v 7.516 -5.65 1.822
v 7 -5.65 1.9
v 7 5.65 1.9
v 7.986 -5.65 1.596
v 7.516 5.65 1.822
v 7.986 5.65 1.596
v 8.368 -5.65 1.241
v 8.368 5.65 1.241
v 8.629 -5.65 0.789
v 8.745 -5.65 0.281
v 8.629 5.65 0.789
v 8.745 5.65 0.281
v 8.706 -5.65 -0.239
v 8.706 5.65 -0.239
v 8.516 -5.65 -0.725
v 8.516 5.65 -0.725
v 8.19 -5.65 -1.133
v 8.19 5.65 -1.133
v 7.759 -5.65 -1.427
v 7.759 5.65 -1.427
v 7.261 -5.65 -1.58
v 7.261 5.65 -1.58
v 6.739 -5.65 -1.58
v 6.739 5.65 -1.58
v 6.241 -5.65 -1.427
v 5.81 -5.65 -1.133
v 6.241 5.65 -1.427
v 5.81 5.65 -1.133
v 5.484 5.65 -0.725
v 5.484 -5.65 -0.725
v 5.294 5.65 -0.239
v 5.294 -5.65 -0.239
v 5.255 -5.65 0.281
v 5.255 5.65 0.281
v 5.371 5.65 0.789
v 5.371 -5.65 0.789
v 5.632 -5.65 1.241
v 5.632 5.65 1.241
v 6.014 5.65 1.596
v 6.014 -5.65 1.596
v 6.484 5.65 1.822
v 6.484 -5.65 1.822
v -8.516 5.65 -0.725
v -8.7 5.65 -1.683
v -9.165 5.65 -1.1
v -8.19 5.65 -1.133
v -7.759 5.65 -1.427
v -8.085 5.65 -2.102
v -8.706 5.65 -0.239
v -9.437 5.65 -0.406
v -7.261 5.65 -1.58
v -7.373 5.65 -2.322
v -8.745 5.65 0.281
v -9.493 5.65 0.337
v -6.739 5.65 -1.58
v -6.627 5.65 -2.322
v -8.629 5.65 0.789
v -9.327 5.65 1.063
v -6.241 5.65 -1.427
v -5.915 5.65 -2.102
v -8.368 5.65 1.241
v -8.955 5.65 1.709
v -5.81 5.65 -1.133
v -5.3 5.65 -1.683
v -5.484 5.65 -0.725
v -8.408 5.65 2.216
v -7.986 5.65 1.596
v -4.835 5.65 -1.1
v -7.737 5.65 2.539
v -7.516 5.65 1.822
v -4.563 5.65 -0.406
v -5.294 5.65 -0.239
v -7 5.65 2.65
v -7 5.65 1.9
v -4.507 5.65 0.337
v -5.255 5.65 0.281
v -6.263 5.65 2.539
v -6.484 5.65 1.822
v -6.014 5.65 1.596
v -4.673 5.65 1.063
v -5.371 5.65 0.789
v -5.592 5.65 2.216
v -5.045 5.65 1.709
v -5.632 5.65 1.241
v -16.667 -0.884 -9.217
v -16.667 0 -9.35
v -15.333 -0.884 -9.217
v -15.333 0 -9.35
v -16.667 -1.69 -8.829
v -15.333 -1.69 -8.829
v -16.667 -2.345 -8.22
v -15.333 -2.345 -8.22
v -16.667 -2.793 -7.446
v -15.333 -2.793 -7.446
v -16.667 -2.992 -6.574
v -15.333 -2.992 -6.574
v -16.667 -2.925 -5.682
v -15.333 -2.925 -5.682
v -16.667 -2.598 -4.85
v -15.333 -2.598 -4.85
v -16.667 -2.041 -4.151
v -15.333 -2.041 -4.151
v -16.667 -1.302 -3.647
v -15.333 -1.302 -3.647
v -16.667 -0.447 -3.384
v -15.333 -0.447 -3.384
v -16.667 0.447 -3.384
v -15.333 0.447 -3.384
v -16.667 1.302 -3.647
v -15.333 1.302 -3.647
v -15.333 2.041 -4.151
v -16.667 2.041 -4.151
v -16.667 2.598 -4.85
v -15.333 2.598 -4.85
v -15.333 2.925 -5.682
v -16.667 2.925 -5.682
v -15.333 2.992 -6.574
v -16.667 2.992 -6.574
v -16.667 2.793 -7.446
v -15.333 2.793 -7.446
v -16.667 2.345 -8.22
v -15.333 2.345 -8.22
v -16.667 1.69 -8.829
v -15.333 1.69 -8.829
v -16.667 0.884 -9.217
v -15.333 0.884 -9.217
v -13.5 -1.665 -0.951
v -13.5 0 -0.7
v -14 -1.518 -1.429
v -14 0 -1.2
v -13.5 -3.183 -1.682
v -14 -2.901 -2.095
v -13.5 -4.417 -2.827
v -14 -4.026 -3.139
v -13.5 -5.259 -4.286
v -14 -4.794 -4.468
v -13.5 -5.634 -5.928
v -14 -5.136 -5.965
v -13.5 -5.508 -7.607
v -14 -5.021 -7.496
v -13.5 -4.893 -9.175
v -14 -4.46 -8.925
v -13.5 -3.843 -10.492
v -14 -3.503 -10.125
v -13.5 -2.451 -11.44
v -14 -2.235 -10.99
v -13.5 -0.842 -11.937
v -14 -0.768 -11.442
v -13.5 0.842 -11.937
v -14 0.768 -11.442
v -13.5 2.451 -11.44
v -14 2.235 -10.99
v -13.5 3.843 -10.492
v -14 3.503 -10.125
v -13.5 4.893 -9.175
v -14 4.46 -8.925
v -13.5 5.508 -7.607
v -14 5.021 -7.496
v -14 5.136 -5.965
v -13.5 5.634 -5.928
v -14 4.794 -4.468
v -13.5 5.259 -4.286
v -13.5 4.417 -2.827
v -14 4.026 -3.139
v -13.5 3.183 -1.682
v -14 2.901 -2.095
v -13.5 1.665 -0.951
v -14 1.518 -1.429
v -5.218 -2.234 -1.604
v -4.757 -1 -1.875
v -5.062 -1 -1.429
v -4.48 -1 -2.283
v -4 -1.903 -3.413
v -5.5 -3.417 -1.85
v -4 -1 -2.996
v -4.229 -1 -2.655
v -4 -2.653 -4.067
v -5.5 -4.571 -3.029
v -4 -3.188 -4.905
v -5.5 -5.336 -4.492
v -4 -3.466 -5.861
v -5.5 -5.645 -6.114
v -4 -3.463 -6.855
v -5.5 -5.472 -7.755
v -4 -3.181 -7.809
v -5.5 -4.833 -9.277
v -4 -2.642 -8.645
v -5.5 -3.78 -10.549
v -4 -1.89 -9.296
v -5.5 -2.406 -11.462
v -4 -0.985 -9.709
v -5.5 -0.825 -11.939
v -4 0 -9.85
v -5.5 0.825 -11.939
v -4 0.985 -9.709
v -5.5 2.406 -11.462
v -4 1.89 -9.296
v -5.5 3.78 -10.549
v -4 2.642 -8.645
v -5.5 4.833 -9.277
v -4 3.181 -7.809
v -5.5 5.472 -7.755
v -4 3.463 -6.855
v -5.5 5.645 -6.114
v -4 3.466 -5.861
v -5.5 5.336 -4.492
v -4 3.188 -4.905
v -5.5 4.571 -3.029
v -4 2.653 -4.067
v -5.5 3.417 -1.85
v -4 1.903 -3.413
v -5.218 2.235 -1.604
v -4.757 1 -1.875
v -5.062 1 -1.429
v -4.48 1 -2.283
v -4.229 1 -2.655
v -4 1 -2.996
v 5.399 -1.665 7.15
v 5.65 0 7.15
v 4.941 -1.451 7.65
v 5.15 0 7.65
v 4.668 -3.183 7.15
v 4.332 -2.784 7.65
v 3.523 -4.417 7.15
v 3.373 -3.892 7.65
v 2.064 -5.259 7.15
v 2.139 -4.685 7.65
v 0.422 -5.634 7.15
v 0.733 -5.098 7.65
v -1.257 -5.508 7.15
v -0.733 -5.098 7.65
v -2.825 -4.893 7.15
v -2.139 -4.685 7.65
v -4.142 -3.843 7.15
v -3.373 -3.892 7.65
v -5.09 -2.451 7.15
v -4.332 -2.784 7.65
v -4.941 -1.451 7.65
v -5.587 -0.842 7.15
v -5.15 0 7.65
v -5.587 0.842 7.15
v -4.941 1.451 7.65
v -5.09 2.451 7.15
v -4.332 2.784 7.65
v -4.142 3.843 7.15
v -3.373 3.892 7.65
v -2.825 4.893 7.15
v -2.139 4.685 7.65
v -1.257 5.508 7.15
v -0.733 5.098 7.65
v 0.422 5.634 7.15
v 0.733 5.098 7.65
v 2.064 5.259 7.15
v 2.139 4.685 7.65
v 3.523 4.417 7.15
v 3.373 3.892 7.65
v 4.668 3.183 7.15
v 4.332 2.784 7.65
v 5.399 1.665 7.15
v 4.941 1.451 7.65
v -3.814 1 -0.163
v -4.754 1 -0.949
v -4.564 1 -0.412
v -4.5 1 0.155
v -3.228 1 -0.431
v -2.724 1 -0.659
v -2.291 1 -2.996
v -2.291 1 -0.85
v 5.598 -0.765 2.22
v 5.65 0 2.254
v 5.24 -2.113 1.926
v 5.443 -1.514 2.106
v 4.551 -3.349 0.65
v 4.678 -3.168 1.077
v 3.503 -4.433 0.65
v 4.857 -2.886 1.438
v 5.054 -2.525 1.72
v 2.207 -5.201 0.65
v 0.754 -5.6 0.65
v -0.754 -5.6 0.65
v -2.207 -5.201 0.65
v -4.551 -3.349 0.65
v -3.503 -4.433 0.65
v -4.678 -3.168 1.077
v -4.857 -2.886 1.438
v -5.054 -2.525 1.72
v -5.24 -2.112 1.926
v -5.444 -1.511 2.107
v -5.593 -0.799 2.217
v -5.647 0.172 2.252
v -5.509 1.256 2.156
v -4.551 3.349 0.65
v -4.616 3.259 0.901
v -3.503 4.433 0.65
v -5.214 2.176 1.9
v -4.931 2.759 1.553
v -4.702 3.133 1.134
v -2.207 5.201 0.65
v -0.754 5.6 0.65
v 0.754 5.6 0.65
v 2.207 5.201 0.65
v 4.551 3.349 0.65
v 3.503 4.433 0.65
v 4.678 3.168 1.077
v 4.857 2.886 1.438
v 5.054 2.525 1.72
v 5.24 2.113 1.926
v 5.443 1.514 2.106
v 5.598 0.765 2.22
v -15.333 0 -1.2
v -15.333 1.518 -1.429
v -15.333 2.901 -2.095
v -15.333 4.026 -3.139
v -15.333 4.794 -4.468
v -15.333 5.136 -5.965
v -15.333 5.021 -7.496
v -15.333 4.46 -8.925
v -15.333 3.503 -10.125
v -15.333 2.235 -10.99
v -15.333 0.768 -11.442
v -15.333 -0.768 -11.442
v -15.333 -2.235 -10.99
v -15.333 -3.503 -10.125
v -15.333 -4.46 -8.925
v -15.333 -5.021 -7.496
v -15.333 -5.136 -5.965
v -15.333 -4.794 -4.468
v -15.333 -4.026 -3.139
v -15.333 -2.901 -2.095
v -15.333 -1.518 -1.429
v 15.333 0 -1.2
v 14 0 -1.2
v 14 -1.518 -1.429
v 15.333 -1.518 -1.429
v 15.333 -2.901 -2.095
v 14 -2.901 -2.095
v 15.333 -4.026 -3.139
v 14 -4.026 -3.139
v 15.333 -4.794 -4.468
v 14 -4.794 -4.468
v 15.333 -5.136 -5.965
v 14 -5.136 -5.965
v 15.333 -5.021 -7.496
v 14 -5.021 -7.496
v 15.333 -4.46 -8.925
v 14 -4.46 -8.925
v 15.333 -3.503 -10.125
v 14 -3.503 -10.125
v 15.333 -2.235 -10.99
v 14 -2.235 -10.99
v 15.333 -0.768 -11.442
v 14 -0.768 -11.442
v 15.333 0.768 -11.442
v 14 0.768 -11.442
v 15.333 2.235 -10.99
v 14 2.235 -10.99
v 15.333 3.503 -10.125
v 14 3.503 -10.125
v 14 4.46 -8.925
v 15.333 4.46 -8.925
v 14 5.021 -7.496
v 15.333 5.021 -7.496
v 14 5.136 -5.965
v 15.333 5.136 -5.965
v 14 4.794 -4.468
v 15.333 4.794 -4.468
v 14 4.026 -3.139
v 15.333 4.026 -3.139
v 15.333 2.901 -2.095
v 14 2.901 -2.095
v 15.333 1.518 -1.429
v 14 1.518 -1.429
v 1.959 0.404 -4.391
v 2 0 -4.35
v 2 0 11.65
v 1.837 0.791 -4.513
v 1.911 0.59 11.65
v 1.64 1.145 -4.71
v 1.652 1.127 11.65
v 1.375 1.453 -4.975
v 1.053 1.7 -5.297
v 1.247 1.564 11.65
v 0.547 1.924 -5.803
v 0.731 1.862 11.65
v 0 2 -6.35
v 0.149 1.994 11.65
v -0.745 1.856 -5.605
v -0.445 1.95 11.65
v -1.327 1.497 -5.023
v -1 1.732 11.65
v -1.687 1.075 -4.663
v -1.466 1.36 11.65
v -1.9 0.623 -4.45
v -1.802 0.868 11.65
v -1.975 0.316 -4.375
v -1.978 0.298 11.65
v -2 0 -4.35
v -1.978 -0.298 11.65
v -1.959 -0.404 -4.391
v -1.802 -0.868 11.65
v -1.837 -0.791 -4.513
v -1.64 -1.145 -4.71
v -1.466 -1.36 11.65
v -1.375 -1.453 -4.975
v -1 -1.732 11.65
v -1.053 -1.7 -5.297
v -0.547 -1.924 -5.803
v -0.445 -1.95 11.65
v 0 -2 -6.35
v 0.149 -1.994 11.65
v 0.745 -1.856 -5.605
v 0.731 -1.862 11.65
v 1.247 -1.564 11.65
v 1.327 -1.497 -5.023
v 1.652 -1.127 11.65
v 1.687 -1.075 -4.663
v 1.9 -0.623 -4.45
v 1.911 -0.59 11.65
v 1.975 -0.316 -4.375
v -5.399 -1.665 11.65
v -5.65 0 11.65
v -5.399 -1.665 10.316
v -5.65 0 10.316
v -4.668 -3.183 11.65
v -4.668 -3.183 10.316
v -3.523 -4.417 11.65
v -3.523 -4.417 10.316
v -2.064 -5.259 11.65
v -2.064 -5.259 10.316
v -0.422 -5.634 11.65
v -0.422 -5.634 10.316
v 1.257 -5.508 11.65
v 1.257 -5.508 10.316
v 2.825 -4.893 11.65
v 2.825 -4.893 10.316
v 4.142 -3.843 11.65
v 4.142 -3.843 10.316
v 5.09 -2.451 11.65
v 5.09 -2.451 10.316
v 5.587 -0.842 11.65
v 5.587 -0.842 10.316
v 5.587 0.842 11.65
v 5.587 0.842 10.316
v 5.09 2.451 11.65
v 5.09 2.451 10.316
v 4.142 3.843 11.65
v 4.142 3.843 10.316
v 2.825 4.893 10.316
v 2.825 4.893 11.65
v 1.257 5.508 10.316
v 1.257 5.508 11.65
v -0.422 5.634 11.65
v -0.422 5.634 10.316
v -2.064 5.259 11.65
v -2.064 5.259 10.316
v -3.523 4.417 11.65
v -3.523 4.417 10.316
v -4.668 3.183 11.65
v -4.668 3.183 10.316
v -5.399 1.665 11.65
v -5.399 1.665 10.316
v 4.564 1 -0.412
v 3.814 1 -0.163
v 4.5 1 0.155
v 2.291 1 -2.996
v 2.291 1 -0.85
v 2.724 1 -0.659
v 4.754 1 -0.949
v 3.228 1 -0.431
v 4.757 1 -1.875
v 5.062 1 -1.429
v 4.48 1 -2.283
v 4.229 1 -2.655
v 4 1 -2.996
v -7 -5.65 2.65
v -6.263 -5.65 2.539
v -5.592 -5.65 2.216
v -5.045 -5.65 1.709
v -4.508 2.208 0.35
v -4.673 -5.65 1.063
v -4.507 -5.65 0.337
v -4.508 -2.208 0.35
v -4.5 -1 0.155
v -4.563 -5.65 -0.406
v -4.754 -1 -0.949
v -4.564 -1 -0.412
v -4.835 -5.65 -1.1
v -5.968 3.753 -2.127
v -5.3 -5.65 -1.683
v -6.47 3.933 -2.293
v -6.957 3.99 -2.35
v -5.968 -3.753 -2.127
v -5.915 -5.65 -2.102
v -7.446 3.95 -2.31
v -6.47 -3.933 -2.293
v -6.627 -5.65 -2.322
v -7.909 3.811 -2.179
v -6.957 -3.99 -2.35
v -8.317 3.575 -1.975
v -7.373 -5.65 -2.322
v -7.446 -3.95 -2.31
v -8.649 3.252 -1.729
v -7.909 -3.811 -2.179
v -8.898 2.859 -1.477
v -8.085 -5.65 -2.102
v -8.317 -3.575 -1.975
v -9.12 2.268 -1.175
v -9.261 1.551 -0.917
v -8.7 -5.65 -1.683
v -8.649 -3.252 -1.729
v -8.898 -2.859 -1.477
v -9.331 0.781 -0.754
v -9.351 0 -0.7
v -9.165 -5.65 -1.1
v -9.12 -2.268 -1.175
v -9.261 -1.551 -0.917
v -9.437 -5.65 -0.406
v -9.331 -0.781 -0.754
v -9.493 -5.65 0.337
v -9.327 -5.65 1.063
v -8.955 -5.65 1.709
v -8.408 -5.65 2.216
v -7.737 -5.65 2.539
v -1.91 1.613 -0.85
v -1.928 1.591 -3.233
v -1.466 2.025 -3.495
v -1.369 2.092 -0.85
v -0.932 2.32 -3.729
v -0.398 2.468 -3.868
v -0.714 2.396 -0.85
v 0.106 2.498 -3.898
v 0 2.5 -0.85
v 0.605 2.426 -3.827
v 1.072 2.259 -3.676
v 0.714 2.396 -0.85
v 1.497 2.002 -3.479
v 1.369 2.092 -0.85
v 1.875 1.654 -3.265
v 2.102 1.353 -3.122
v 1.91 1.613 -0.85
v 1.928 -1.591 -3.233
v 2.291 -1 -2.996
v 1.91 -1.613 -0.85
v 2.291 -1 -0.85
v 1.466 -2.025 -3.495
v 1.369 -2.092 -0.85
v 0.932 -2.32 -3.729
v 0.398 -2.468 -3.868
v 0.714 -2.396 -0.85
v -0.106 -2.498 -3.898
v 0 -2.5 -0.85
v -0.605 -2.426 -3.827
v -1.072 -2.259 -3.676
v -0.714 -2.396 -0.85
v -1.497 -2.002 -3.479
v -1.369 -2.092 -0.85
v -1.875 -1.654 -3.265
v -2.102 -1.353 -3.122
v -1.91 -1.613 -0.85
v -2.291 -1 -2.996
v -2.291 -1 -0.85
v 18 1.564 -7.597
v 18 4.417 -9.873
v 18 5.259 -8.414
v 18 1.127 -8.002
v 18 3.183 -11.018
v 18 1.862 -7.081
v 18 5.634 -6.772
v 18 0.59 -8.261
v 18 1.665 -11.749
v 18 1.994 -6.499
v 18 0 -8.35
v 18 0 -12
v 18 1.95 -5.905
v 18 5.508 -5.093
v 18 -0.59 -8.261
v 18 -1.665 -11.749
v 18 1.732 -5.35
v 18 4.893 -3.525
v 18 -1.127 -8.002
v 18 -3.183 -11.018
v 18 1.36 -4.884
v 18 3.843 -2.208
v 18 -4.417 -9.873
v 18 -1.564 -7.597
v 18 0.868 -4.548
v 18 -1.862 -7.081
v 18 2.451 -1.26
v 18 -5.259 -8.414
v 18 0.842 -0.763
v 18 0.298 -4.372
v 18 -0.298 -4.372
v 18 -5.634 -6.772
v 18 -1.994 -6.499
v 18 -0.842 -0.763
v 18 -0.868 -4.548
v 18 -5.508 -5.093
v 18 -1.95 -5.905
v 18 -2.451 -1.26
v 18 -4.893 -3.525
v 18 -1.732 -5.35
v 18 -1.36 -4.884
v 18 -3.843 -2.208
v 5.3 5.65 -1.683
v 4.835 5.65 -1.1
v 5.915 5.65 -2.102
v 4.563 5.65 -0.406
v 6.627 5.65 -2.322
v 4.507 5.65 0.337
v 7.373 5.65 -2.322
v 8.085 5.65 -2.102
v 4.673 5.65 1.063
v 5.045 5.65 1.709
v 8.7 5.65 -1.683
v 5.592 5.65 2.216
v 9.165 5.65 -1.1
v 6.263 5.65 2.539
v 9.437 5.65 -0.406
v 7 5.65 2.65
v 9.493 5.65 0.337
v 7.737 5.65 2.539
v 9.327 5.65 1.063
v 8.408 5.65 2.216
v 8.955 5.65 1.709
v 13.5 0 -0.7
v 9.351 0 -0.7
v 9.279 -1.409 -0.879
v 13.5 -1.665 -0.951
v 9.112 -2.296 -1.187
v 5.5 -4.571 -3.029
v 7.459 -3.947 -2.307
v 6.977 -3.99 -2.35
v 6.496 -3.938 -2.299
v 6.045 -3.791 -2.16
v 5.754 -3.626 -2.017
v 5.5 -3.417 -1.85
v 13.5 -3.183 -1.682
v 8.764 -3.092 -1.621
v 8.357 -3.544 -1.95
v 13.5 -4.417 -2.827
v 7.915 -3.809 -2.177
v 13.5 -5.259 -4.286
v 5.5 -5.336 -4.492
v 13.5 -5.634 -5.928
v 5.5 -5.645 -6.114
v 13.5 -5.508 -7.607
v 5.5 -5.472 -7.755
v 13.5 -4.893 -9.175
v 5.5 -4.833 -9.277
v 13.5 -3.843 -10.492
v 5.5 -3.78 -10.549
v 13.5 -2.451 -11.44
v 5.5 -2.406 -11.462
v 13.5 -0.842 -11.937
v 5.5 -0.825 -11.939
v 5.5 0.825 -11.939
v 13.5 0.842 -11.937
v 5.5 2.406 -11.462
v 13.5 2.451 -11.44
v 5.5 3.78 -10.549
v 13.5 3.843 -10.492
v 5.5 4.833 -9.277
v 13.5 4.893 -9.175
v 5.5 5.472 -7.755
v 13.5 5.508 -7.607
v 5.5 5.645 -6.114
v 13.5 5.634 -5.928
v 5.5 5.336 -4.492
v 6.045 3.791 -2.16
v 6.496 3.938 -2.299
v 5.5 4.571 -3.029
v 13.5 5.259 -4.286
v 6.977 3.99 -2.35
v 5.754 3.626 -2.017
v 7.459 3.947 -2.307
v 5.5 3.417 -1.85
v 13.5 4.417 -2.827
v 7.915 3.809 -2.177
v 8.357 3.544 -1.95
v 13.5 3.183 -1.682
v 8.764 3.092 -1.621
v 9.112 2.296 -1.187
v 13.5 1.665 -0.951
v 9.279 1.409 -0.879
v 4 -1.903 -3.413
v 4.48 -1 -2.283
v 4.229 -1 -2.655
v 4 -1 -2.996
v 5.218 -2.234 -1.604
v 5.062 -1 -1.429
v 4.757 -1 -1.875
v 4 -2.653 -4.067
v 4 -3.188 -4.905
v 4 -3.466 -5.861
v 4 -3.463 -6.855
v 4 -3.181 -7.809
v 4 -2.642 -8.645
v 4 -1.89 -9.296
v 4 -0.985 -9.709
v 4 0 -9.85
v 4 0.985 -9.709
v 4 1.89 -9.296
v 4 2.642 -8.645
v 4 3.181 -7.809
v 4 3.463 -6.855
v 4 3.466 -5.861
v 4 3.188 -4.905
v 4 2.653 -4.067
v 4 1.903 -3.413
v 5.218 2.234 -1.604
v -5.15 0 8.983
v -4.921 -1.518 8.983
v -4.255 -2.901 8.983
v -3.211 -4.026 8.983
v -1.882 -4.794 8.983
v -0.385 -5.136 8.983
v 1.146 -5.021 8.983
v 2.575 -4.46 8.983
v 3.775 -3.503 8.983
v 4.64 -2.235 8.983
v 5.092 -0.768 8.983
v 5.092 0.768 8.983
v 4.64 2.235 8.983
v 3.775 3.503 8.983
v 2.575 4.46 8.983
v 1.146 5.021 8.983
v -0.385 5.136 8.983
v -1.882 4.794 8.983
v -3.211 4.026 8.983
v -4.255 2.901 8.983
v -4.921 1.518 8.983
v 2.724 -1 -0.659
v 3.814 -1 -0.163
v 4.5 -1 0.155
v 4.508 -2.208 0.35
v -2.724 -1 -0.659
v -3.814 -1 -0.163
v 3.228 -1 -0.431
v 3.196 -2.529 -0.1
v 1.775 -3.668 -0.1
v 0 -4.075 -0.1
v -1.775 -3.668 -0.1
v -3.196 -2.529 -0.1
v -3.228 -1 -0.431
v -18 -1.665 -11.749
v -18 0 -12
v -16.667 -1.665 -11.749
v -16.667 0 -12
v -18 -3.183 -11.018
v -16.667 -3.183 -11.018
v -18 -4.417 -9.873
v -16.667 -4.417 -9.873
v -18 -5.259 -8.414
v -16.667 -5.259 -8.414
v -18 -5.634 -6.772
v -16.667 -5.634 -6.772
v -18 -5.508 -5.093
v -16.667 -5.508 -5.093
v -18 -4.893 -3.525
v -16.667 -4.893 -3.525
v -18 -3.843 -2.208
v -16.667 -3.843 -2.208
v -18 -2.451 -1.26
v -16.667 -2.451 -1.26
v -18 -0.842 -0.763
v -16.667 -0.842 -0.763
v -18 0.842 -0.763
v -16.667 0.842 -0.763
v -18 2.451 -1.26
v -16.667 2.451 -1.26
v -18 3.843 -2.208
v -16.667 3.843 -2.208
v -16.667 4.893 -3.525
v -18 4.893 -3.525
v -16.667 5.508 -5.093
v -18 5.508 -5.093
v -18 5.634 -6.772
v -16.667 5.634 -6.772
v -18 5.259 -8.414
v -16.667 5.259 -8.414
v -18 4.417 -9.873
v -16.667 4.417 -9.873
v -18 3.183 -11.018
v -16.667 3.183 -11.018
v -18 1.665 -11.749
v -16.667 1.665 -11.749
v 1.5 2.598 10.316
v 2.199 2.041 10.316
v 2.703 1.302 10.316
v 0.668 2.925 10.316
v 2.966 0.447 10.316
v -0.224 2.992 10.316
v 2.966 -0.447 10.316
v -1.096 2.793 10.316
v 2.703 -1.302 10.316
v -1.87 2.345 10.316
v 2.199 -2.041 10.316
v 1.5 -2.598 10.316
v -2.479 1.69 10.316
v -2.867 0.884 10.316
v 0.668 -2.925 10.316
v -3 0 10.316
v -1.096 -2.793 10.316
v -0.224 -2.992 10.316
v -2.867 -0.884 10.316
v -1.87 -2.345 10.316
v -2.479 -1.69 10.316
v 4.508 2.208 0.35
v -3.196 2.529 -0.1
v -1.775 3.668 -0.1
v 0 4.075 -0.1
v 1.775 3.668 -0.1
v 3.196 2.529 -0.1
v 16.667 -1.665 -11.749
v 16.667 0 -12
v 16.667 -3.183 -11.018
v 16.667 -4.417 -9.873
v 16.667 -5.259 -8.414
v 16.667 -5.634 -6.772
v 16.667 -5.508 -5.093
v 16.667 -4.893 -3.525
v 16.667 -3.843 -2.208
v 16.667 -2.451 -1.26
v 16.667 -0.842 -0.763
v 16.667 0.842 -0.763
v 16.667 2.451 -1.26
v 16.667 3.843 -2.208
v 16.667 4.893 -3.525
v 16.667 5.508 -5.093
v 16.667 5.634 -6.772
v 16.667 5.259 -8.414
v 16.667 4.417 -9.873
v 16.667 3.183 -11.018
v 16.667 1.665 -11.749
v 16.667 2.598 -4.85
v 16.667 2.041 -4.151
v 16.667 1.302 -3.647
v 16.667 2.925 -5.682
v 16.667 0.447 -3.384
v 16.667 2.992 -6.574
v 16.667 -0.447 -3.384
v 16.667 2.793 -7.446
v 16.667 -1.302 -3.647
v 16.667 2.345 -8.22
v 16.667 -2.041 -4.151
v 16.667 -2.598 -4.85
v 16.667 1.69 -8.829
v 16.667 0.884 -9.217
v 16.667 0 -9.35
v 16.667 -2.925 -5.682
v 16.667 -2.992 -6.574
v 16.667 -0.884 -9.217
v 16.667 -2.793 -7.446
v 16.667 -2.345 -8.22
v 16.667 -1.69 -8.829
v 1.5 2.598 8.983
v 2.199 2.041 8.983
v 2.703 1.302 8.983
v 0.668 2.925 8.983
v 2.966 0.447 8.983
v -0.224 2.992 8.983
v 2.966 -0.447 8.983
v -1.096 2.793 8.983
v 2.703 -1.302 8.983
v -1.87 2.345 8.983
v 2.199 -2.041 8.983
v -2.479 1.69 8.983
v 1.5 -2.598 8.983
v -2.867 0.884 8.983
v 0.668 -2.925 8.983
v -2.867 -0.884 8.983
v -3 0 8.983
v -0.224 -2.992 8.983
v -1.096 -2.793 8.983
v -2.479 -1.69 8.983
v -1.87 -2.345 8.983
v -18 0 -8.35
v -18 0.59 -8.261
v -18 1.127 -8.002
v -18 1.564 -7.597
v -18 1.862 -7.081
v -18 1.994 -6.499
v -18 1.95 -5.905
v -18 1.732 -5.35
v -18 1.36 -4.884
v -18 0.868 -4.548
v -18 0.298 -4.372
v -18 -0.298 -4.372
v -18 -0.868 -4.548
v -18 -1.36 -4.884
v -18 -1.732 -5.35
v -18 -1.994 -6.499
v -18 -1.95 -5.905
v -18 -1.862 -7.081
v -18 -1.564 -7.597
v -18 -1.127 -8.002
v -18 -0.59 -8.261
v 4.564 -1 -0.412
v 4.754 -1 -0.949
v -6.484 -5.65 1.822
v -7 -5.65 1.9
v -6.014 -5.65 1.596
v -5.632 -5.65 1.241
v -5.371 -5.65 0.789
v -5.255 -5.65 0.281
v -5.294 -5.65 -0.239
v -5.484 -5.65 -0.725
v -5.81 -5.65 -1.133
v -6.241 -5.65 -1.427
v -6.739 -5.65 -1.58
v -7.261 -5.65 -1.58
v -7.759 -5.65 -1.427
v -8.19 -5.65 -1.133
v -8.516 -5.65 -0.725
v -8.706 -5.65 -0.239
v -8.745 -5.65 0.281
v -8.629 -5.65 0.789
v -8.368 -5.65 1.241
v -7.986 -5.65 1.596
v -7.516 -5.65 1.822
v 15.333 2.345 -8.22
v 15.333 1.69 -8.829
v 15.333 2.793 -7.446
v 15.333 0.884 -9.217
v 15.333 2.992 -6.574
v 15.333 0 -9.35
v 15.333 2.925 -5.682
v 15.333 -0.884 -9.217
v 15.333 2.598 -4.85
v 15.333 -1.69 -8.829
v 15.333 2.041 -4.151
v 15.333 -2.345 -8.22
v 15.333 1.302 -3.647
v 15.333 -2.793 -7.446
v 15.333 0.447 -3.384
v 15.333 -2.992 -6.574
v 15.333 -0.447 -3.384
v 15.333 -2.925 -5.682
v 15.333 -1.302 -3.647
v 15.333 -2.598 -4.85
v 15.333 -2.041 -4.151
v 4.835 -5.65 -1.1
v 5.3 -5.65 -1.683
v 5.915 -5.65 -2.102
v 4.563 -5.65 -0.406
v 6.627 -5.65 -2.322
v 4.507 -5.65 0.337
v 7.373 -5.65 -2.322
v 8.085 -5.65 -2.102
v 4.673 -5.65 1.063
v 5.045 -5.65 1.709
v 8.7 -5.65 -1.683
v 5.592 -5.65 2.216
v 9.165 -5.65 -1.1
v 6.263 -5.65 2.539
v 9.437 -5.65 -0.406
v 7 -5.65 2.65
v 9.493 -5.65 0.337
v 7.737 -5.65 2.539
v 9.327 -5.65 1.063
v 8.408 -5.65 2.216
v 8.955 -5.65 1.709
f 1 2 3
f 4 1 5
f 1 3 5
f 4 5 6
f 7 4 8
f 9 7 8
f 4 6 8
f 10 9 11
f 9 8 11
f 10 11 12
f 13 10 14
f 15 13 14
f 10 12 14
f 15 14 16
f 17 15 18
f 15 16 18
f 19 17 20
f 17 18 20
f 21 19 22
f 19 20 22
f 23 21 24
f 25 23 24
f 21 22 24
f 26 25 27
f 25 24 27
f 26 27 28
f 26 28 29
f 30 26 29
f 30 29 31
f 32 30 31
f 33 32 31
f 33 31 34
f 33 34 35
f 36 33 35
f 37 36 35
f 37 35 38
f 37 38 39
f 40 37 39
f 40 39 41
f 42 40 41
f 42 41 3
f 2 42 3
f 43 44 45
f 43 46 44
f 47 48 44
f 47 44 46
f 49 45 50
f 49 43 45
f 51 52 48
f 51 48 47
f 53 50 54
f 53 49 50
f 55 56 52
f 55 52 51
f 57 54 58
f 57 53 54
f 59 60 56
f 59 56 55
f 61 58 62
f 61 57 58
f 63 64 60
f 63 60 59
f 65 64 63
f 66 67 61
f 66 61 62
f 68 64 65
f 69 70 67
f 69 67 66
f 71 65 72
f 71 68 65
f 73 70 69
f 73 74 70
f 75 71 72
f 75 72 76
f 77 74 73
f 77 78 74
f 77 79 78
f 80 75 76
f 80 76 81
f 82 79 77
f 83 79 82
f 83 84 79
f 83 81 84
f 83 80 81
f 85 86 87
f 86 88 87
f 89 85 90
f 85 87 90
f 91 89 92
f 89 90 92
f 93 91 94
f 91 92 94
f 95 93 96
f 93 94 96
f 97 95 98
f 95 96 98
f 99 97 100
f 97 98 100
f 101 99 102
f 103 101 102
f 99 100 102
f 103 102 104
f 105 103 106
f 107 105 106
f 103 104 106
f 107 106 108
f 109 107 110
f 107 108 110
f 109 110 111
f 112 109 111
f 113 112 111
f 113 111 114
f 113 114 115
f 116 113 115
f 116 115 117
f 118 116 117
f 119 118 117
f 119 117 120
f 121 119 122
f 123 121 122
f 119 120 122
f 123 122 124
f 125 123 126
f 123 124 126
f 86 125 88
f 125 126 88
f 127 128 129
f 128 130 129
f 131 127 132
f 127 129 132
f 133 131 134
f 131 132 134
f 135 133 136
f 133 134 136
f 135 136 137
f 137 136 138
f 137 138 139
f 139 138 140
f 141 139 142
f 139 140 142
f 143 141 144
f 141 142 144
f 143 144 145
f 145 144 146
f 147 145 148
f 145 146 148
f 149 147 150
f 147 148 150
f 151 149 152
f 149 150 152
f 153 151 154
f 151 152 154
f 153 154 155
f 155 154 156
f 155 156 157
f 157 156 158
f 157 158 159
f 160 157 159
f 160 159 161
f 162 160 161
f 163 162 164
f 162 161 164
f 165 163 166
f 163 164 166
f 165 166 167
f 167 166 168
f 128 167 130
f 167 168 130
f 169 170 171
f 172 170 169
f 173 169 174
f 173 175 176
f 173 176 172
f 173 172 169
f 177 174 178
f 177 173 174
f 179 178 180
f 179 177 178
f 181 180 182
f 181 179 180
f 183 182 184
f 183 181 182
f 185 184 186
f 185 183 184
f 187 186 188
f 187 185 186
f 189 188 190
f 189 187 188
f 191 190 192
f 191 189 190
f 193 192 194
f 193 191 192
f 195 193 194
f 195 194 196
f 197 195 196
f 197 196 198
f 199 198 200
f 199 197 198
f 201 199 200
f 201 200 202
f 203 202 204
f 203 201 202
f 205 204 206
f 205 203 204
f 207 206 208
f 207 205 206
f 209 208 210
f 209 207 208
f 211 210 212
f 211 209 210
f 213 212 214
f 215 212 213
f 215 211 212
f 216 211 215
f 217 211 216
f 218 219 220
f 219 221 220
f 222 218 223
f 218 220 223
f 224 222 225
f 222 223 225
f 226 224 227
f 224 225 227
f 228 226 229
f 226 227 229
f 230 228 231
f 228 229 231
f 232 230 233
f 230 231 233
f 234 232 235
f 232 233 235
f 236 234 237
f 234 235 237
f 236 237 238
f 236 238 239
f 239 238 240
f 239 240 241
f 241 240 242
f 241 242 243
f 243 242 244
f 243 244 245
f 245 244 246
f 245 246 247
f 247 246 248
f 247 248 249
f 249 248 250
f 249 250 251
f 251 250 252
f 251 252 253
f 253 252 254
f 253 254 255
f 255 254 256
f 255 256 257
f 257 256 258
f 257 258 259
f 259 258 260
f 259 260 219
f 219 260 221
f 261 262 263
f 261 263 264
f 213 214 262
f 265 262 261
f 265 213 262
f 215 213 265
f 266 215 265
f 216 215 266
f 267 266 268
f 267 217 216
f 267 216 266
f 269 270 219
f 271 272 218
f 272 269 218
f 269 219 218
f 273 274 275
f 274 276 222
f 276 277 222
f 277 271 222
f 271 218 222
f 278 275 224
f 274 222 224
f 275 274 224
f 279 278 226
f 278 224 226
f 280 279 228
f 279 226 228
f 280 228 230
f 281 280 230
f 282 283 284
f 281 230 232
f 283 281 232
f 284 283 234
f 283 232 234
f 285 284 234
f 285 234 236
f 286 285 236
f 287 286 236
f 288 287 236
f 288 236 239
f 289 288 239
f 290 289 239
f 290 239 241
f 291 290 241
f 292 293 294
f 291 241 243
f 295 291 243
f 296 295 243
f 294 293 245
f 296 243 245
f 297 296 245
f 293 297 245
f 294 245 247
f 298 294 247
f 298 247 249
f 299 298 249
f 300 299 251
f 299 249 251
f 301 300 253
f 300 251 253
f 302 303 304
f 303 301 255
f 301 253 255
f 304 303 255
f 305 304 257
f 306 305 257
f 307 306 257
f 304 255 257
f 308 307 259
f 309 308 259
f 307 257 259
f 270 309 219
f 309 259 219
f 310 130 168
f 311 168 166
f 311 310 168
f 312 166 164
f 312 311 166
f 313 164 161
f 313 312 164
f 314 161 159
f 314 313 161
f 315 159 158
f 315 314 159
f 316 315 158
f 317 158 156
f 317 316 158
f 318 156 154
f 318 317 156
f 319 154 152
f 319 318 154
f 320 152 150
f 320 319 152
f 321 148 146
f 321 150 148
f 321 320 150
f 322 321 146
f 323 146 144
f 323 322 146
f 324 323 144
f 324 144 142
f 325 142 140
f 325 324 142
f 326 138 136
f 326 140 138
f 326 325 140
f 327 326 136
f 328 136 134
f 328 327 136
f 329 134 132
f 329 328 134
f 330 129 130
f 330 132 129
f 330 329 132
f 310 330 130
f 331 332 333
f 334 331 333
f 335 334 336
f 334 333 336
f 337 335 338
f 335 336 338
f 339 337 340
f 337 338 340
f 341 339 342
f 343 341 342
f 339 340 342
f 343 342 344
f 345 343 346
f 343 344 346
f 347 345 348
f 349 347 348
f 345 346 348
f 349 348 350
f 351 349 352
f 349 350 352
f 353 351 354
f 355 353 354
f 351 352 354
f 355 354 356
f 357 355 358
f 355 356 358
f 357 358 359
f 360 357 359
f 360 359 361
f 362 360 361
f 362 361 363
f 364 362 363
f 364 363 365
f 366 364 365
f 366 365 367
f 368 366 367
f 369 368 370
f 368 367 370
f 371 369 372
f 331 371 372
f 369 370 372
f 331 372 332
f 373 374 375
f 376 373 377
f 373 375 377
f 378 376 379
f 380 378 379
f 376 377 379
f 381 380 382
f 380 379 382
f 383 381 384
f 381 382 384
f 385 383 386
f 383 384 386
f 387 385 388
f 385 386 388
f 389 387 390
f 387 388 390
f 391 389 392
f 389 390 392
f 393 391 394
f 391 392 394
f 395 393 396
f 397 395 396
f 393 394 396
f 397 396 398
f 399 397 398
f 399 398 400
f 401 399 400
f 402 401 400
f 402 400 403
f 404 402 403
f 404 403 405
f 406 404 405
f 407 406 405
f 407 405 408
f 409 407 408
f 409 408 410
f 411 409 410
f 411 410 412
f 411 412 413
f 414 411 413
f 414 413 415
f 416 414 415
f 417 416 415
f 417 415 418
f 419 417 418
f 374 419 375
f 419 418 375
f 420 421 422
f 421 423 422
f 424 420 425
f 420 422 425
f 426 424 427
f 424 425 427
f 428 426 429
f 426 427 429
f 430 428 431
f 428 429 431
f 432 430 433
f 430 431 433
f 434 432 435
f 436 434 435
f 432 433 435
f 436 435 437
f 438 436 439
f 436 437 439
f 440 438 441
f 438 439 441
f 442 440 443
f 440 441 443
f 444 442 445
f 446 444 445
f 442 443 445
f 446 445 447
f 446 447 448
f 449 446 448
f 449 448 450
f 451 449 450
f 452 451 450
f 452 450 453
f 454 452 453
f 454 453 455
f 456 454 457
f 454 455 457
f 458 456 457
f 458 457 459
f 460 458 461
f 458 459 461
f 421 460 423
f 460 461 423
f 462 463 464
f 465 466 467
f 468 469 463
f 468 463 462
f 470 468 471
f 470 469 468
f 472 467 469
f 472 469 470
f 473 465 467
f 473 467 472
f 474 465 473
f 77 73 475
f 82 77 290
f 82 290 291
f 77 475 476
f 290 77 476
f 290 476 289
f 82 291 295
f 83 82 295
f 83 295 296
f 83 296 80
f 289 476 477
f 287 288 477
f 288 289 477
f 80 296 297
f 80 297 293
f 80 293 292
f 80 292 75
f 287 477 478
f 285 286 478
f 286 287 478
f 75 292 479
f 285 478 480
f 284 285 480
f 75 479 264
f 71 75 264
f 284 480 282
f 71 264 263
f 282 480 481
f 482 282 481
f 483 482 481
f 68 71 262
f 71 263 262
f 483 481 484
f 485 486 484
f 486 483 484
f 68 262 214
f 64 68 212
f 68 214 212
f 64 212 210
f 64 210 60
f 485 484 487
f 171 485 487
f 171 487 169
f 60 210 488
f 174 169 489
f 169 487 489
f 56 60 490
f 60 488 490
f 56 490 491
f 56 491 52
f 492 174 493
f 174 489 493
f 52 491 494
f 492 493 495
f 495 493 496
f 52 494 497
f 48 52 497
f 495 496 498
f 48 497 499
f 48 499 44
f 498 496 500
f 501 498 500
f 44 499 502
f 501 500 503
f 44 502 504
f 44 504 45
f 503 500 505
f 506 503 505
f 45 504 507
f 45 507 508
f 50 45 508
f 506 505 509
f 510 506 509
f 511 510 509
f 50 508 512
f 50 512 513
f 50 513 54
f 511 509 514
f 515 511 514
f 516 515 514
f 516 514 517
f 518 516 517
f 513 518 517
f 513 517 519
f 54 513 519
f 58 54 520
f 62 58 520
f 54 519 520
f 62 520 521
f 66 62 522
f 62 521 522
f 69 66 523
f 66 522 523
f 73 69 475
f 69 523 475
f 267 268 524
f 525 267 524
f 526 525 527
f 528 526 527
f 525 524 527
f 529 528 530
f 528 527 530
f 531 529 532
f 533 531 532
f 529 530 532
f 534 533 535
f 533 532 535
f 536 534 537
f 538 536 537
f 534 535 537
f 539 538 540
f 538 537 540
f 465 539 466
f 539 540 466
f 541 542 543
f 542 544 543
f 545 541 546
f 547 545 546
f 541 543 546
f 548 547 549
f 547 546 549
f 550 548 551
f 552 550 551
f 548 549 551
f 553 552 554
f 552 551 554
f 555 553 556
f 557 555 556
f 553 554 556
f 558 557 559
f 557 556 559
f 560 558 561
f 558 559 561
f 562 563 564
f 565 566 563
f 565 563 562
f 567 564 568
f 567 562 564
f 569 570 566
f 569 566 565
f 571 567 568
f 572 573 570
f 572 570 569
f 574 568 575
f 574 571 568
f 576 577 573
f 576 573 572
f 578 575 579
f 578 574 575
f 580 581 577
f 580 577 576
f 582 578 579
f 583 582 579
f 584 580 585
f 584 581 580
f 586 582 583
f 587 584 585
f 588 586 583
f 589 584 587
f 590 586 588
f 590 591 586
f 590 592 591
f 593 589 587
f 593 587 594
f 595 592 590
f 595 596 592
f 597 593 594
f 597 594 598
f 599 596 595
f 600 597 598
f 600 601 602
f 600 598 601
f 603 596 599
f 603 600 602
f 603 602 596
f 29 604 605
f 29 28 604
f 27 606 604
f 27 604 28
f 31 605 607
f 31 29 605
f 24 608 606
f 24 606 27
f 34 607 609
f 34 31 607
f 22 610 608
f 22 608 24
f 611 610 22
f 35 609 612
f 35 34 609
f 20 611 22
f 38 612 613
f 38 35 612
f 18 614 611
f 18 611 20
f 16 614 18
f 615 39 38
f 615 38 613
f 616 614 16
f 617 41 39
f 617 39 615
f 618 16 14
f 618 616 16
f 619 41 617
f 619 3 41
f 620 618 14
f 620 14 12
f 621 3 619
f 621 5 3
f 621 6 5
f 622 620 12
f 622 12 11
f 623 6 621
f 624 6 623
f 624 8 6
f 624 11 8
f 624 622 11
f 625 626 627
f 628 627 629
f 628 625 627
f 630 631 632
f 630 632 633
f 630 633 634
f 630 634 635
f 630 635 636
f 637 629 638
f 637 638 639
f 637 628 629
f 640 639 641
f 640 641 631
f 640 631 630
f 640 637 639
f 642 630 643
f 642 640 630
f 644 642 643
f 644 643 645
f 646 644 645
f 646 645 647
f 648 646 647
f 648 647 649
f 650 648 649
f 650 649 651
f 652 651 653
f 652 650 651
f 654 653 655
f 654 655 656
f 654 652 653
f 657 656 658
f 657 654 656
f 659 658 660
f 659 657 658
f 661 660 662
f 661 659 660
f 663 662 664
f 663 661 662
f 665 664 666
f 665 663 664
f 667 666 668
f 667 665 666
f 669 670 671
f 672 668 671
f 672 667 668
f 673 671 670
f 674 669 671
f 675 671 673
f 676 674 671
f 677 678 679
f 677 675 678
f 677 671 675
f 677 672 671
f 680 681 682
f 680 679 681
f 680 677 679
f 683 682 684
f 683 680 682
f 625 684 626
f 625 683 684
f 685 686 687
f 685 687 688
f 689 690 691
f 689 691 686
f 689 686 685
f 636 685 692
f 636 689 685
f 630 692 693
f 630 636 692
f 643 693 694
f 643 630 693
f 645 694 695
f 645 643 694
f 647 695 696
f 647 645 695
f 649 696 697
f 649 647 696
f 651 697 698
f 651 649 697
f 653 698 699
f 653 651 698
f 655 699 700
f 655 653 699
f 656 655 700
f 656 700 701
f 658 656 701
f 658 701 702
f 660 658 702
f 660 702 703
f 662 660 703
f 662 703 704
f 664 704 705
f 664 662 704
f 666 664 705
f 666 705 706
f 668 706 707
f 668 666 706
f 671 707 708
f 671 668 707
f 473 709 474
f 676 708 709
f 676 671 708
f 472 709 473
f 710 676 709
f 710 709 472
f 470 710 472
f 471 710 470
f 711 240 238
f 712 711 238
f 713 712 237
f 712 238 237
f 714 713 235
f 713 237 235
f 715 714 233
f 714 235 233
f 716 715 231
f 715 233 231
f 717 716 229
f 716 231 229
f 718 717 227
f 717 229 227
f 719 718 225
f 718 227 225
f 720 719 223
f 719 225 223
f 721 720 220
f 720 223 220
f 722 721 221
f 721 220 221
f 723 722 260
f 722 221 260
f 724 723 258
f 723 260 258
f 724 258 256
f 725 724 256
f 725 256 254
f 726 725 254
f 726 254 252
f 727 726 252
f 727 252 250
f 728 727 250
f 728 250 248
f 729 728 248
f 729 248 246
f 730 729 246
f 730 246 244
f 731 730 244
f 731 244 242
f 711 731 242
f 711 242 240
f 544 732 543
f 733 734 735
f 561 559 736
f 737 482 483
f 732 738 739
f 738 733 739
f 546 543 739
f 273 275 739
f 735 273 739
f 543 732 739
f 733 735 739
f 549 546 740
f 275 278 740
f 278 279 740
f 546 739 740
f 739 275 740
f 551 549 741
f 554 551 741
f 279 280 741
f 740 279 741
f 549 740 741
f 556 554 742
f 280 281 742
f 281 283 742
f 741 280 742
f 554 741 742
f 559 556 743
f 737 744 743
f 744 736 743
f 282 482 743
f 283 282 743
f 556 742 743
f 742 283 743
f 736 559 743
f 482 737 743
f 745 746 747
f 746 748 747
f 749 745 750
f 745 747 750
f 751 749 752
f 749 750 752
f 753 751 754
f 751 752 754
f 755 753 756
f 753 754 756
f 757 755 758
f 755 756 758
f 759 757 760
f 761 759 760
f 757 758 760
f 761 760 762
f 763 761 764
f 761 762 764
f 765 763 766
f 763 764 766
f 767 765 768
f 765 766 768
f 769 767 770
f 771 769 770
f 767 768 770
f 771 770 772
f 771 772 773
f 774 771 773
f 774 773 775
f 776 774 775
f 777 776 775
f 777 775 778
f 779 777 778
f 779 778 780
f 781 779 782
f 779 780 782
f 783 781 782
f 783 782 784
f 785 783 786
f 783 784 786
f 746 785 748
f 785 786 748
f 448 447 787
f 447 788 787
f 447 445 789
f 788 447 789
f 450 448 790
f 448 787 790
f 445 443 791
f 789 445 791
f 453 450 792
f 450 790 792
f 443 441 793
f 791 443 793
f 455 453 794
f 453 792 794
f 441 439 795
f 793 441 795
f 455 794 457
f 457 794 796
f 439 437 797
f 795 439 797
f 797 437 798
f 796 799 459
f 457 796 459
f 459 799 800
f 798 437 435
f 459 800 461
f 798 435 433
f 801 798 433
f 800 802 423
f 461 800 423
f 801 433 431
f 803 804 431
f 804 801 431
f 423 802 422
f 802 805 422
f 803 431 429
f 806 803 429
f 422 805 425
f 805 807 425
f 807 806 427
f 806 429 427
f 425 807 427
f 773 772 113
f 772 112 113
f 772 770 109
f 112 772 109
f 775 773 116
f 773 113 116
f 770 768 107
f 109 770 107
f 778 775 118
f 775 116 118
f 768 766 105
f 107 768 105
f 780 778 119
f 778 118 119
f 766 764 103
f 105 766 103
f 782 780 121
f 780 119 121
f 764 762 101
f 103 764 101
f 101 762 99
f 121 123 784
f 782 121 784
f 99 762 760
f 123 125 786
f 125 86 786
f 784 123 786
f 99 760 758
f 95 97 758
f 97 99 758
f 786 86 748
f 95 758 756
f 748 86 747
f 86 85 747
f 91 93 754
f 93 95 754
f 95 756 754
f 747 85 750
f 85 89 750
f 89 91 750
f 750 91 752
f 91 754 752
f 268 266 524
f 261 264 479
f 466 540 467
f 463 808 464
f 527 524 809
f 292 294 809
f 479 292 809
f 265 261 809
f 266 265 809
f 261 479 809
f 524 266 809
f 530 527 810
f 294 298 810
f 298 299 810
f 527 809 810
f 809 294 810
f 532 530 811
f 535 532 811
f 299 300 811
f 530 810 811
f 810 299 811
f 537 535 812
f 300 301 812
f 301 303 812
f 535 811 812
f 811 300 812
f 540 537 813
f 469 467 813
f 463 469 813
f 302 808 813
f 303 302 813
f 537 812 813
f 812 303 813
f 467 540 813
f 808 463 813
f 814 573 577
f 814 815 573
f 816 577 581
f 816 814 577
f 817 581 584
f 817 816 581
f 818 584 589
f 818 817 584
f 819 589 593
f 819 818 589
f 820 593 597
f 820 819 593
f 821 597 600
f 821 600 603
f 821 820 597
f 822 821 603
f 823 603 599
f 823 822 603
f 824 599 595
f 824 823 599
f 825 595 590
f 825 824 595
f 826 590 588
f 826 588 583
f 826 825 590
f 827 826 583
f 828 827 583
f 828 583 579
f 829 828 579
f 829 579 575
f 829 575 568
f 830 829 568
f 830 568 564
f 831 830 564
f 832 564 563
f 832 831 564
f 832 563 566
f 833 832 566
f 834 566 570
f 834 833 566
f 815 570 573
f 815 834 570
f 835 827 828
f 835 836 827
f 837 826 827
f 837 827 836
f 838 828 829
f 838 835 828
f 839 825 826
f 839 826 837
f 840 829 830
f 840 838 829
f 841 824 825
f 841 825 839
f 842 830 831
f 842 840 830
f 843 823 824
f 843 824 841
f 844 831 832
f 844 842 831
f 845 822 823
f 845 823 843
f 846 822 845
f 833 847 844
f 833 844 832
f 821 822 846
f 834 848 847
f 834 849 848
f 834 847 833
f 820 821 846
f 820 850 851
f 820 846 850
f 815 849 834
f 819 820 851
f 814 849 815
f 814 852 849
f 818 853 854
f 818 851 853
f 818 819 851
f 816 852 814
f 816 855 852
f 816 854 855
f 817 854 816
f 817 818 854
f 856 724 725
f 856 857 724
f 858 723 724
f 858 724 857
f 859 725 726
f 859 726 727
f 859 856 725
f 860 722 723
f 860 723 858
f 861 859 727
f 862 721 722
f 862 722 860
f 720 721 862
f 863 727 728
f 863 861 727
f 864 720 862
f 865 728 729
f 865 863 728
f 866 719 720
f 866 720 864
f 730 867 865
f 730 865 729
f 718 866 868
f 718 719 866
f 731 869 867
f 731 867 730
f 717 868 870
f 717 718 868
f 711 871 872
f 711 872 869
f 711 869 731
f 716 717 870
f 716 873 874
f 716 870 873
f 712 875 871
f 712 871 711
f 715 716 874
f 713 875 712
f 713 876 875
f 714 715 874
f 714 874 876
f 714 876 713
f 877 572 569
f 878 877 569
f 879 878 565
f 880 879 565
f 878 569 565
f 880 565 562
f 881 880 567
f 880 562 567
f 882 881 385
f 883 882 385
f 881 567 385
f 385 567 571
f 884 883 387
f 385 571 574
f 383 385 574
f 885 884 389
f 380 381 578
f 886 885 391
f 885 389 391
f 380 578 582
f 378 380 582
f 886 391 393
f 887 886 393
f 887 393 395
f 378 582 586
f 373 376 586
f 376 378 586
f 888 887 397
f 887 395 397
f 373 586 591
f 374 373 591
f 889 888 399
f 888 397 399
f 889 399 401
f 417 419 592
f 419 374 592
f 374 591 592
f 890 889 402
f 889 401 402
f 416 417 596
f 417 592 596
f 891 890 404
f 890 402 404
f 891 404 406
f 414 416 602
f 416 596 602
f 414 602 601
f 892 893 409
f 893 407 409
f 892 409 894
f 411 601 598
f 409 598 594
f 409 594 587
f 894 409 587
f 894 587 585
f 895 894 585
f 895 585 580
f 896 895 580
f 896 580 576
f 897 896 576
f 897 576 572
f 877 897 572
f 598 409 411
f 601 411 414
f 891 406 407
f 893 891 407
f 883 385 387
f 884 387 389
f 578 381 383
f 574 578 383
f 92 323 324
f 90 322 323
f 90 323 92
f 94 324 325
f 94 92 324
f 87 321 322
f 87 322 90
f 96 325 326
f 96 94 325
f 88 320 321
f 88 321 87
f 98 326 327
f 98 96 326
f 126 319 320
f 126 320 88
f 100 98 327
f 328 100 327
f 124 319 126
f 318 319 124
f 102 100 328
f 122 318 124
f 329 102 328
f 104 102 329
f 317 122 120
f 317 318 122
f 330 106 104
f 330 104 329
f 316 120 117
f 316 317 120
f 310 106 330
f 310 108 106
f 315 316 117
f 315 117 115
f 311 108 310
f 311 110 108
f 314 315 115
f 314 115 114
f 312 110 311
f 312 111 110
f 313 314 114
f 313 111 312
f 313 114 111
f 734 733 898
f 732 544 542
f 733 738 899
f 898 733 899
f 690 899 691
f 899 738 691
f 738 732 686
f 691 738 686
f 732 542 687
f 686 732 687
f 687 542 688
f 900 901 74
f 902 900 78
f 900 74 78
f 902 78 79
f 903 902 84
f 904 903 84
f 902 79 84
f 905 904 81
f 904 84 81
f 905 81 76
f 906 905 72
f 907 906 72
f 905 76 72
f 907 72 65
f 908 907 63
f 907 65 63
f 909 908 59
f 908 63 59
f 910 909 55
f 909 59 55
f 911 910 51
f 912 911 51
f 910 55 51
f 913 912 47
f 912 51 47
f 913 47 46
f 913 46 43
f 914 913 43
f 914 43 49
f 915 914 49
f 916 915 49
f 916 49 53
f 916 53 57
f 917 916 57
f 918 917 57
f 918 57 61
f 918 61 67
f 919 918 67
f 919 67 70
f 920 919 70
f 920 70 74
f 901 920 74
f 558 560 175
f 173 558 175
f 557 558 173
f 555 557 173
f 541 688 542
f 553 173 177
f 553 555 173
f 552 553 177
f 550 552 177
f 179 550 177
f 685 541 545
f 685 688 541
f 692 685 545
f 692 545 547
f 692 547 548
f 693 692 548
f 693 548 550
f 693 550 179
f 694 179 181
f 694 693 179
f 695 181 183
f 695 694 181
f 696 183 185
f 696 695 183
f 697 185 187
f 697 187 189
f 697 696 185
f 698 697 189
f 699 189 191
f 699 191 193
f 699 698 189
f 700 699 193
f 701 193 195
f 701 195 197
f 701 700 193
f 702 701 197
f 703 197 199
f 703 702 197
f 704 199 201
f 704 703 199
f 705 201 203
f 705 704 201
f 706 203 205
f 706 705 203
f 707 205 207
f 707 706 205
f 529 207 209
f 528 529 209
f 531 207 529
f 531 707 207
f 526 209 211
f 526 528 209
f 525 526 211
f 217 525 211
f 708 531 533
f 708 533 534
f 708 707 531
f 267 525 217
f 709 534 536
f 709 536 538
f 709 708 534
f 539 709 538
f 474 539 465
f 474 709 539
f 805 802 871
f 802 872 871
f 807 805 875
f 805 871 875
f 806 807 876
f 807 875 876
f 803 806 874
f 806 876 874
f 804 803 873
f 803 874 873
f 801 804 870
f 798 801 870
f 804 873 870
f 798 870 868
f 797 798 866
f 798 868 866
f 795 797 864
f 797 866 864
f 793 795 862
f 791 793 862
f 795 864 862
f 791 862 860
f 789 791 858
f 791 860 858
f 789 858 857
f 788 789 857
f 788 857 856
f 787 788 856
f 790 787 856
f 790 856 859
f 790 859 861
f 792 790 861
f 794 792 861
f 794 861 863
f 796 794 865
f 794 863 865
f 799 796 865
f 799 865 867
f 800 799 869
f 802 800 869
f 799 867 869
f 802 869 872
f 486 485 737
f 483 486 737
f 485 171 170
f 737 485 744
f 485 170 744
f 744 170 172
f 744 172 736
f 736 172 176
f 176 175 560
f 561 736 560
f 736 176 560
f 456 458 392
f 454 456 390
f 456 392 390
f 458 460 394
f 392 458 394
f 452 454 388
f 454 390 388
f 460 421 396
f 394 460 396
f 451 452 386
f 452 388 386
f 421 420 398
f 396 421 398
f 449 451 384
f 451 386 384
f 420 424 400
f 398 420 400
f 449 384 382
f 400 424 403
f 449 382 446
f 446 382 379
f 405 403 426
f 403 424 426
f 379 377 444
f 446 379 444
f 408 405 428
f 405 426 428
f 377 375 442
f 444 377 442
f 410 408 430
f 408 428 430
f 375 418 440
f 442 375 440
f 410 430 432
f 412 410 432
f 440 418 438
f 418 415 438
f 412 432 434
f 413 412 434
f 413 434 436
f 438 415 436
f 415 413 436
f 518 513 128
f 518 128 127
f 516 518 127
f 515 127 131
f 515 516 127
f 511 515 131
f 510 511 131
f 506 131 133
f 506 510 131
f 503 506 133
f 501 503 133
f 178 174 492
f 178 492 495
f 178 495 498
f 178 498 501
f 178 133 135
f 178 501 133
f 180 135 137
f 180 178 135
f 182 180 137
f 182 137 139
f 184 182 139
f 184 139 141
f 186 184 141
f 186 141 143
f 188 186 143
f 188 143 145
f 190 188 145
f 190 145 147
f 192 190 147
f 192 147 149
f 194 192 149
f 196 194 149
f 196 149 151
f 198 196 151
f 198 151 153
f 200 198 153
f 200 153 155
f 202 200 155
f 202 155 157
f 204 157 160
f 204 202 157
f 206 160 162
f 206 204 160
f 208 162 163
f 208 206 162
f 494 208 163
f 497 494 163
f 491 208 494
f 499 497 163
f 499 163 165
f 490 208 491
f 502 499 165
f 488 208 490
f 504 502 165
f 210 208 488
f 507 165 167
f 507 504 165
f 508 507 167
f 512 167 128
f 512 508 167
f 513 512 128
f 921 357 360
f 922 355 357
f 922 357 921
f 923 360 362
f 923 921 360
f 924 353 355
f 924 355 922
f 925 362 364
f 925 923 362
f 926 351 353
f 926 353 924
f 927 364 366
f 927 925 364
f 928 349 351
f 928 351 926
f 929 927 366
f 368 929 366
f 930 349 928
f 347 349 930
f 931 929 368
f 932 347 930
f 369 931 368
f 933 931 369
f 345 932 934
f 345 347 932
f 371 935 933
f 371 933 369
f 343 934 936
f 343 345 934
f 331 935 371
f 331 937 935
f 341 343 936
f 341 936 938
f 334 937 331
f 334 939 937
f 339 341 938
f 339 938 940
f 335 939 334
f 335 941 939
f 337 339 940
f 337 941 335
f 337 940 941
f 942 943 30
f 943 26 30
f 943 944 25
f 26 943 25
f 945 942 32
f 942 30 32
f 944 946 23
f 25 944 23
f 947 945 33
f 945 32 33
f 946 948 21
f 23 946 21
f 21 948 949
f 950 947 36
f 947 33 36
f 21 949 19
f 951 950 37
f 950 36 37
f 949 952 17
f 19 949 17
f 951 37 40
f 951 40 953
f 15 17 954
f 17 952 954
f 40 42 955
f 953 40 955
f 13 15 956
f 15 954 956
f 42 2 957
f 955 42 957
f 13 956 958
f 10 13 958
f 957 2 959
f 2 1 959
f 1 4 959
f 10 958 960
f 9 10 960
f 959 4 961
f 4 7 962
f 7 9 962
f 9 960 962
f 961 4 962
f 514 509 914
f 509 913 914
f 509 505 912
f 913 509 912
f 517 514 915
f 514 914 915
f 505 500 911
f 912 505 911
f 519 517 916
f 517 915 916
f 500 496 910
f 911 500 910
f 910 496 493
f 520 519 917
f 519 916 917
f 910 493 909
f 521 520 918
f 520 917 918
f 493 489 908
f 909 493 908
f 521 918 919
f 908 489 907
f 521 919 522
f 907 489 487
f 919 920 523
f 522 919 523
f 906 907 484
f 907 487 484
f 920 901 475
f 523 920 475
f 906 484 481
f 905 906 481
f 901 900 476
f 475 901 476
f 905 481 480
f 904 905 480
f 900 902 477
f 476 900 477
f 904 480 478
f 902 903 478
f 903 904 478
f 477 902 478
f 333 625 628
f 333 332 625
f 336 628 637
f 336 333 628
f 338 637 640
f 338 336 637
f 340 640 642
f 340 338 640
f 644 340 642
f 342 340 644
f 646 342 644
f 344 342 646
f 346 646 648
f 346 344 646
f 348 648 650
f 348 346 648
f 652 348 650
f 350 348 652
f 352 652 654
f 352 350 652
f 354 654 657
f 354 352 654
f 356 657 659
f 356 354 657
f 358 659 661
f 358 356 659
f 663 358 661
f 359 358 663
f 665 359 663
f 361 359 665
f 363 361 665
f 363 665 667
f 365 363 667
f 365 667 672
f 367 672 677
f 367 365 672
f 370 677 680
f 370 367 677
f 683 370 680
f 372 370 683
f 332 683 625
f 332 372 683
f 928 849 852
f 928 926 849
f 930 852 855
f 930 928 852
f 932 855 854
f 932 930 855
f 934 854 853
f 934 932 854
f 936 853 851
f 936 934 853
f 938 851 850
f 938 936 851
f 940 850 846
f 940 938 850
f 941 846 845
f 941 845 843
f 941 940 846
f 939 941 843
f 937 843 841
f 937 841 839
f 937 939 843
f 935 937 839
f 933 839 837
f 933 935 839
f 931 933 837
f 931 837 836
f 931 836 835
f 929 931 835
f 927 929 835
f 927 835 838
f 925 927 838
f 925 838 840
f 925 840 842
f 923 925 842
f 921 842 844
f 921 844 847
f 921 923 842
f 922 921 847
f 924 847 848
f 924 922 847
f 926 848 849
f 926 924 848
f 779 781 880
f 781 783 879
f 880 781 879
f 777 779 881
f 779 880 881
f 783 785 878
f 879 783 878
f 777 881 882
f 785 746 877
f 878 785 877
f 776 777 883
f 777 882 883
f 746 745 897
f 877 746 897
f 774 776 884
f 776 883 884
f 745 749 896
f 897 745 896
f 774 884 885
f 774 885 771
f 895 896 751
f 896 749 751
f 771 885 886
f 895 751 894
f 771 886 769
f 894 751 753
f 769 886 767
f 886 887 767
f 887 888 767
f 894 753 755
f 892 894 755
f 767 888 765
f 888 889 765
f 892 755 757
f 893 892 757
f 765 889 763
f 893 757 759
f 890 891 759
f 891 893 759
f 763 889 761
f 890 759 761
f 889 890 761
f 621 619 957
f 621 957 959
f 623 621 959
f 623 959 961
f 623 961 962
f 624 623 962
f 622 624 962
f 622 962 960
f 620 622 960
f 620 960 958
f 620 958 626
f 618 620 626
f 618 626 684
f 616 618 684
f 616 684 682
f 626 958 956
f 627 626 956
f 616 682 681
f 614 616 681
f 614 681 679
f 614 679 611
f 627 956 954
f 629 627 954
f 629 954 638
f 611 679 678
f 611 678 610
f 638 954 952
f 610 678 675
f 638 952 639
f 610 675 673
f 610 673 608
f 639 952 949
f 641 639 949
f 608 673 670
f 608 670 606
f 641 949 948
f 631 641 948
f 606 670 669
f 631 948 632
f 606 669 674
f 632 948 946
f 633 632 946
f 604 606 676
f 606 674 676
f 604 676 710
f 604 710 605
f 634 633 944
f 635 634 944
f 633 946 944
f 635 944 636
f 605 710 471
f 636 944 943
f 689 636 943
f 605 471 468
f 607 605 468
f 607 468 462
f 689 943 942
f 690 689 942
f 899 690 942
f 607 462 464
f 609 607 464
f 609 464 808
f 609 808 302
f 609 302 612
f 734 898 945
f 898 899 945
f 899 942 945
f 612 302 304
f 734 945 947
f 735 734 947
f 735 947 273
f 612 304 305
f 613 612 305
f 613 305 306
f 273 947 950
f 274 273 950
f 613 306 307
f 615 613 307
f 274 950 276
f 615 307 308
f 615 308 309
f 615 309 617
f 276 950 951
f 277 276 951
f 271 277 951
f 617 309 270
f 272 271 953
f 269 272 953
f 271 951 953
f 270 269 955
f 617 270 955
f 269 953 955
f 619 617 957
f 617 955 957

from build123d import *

# Parameters (mm, degrees)
BOSS_EXTRUDE1_DEPTH      = 5.65
BOSS_EXTRUDE1_DEPTH_BACK = 5.65
SKETCH6_R                = 2.5
SKETCH7_R                = 1.75
CUT_EXTRUDE1_DEPTH       = 22.626141761
BOSS_EXTRUDE3_DEPTH      = 1
BOSS_EXTRUDE3_DEPTH_BACK = 1
SKETCH8_W                = 10.3
SKETCH8_H                = 5
CHAMFER1_SIZE            = 0.5
SKETCH9_R                = 5.15
BOSS_EXTRUDE4_DEPTH      = 1.3333
BOSS_EXTRUDE5_START      = 1.3333
SKETCH10_R               = 5.15
BOSS_EXTRUDE5_DEPTH      = 1.3333
SKETCH11_R               = 5.15
BOSS_EXTRUDE6_DEPTH      = 1.333
SKETCH14_R               = 2
CUT_EXTRUDE2_DEPTH       = 39.36556716
CUT_EXTRUDE3_REACH       = 32.253
CUT_EXTRUDE3_END_RADIUS  = 2
SKETCH16_R               = 2


with BuildPart() as part:
    # Sketch4 → Revolve1 (revolve)
    with BuildSketch(Plane(origin=(0, 0, 0), x_dir=(1, 0, 0), z_dir=(0, 1, 0)), mode=Mode.PRIVATE) as revolve1_sk:
        Polygon((-14, 6.35), (-14, 12), (-5.5, 12), (-4, 9.85), (4, 9.85), (5.5, 12), (14, 12), (14, 6.35), align=None)
    revolve(revolve1_sk.sketch.rotate(Axis((-14, 0, -6.35), (1, 0, 0)), 180), axis=Axis((-14, 0, -6.35), (1, 0, 0)))

    # Sketch5 → Revolve2 (revolve)
    with BuildSketch(Plane(origin=(0, 0, 0), x_dir=(1, 0, 0), z_dir=(0, 1, 0)), mode=Mode.PRIVATE) as revolve2_sk:
        Polygon((-2.5, 2.85), (-2.5, 0.85), (-5.65, -0.65), (-5.65, -7.65), (0, -7.65), (0, 6.35), (-2.5, 6.35), align=None)
    revolve(revolve2_sk.sketch.rotate(Axis((0, 0, 7.65), (0, 0, -1)), 180), axis=Axis((0, 0, 7.65), (0, 0, -1)))

    # Sketch6 → Boss-Extrude1 (add, two sides: drawn at the far end of the back side and taken through both)
    with BuildSketch(Plane(origin=(0, 0, 0), x_dir=(1, 0, 0), z_dir=(0, 1, 0)).offset(-BOSS_EXTRUDE1_DEPTH_BACK)):
        with Locations(Location((-7, -0.15, 0), (0, 0, 270))):
            Circle(SKETCH6_R)
        with Locations(Location((7, -0.15, 0), (0, 0, 270))):
            Circle(SKETCH6_R)
    extrude(amount=BOSS_EXTRUDE1_DEPTH + BOSS_EXTRUDE1_DEPTH_BACK)

    # Sketch7 → Cut-Extrude1 (cut, through all)
    with BuildSketch(Plane(origin=(0, 5.65, 0), x_dir=(1, 0, 0), z_dir=(0, 1, 0))):
        with Locations(Location((7, -0.15, 0), (0, 0, 270))):
            Circle(SKETCH7_R)
        with Locations(Location((-7, -0.15, 0), (0, 0, 270))):
            Circle(SKETCH7_R)
    extrude(amount=-CUT_EXTRUDE1_DEPTH, mode=Mode.SUBTRACT)

    # Sketch8 → Boss-Extrude3 (add, two sides: drawn at the far end of the back side and taken through both)
    with BuildSketch(Plane(origin=(0, 0, 0), x_dir=(1, 0, 0), z_dir=(0, 1, 0)).offset(-BOSS_EXTRUDE3_DEPTH_BACK)):
        with Locations((0, 2)):
            Rectangle(SKETCH8_W, SKETCH8_H)
    extrude(amount=BOSS_EXTRUDE3_DEPTH + BOSS_EXTRUDE3_DEPTH_BACK)

    # Chamfer1
    chamfer1_edges = [part.edges().sort_by_distance(p)[0] for p in [
        (14, 0, -12),
        (-5.65, 0, 7.65),
        (-14, 0, -12),
    ]]
    chamfer(chamfer1_edges, length=CHAMFER1_SIZE)

    # Sketch9 → Boss-Extrude4 (add)
    with BuildSketch(Plane(origin=(14, 0, 0), x_dir=(0, 0, -1), z_dir=(1, 0, 0))):
        with Locations(Location((6.35, 0, 0), (0, 0, 180))):
            Circle(SKETCH9_R)
    extrude(amount=BOSS_EXTRUDE4_DEPTH)

    # Sketch10 → Boss-Extrude5 (add)
    with BuildSketch(Plane.ZY.offset(14).offset(BOSS_EXTRUDE5_START)):
        with Locations((-6.35, 0)):
            Circle(SKETCH10_R)
    extrude(amount=-BOSS_EXTRUDE5_DEPTH)

    # Sketch11 → Boss-Extrude6 (add)
    with BuildSketch(Plane.XY.offset(7.65)):
        with Locations(Location((0, 0, 0), (0, 0, 180))):
            Circle(SKETCH11_R)
    extrude(amount=BOSS_EXTRUDE6_DEPTH)

    # Sketch12 → Revolve3 (revolve)
    with BuildSketch(Plane(origin=(0, 0, 0), x_dir=(1, 0, 0), z_dir=(0, 1, 0))):
        Polygon((15.3333, 6.35), (17.99996, 6.35), (17.99996, 12), (16.66663, 12), (16.66663, 9.35), (15.3333, 9.35), align=None)
        Polygon((-16.66663, 9.35), (-15.3333, 9.35), (-15.3333, 6.35), (-17.99996, 6.35), (-17.99996, 12), (-16.66663, 12), align=None)
    revolve(axis=Axis((-15.3333, 0, -6.35), (-1, 0, 0)))

    # Sketch13 → Revolve4 (revolve)
    with BuildSketch(Plane(origin=(0, 0, 0), x_dir=(1, 0, 0), z_dir=(0, 1, 0))):
        Polygon((0, -8.983), (0, -11.64966), (-5.65, -11.64966), (-5.65, -10.31633), (-3, -10.31633), (-3, -8.983), align=None)
    revolve(axis=Axis((0, 0, 8.983), (0, 0, 1)))

    # Sketch14 → Cut-Extrude2 (cut, through all)
    with BuildSketch(Plane(origin=(17.99996, 0, 0), x_dir=(0, 0, -1), z_dir=(1, 0, 0))):
        with Locations((6.35, 0)):
            Circle(SKETCH14_R)
    extrude(amount=-CUT_EXTRUDE2_DEPTH, mode=Mode.SUBTRACT)

    # Cut-Extrude3: up to this cylinder (the profile starts outside it)
    cut_extrude3_end = Plane(origin=(0, 0, -6.35), z_dir=(1, 0, 0)) * Cylinder(CUT_EXTRUDE3_END_RADIUS, 69.506, mode=Mode.PRIVATE)
    # Sketch16 → Cut-Extrude3 (cut, up to the surface)
    with BuildSketch(Plane.XY.offset(11.64966), mode=Mode.PRIVATE) as cut_extrude3_sk1:
        Circle(SKETCH16_R)
    cut_extrude3_tool1 = extrude(cut_extrude3_sk1.sketch, amount=-CUT_EXTRUDE3_REACH, mode=Mode.PRIVATE) - cut_extrude3_end
    add(cut_extrude3_tool1.solids().sort_by_distance((0, 0, 11.64966))[0], mode=Mode.SUBTRACT)


solid = part.part
